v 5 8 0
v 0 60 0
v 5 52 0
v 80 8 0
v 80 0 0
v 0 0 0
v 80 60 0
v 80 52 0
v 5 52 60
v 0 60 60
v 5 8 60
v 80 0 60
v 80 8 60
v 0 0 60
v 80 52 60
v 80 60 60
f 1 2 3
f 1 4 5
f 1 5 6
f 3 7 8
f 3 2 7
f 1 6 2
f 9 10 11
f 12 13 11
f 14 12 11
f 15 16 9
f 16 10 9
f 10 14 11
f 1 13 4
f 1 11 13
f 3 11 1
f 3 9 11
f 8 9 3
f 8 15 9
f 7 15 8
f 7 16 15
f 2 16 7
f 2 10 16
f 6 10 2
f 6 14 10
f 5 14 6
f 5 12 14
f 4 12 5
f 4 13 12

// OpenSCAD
$fn = 32;

// ----------------------------------------------------------------------
// Structural section: channel 80 x 60 mm
// ----------------------------------------------------------------------

// --- parameters (mm) ---
sec_w = 80;               // channel width, X
sec_h = 60;               // channel height, Y
flange_t = 8;             // flange thickness
web_t = 5;                // web thickness
plate_t = 60;             // cut length, Z (extrusion height)
fit_tol = 0.1;            // declared fit tolerance (prompt contract)
free_tol = 0.3;           // declared free tolerance (prompt contract)

profile = [[0, 0], [80, 0], [80, 8], [5, 8], [5, 52], [80, 52], [80, 60], [0, 60]];  // primary outline, 8 points, counter clockwise

// --- the one profile operation ---
linear_extrude(height = plate_t) polygon(points = profile);
